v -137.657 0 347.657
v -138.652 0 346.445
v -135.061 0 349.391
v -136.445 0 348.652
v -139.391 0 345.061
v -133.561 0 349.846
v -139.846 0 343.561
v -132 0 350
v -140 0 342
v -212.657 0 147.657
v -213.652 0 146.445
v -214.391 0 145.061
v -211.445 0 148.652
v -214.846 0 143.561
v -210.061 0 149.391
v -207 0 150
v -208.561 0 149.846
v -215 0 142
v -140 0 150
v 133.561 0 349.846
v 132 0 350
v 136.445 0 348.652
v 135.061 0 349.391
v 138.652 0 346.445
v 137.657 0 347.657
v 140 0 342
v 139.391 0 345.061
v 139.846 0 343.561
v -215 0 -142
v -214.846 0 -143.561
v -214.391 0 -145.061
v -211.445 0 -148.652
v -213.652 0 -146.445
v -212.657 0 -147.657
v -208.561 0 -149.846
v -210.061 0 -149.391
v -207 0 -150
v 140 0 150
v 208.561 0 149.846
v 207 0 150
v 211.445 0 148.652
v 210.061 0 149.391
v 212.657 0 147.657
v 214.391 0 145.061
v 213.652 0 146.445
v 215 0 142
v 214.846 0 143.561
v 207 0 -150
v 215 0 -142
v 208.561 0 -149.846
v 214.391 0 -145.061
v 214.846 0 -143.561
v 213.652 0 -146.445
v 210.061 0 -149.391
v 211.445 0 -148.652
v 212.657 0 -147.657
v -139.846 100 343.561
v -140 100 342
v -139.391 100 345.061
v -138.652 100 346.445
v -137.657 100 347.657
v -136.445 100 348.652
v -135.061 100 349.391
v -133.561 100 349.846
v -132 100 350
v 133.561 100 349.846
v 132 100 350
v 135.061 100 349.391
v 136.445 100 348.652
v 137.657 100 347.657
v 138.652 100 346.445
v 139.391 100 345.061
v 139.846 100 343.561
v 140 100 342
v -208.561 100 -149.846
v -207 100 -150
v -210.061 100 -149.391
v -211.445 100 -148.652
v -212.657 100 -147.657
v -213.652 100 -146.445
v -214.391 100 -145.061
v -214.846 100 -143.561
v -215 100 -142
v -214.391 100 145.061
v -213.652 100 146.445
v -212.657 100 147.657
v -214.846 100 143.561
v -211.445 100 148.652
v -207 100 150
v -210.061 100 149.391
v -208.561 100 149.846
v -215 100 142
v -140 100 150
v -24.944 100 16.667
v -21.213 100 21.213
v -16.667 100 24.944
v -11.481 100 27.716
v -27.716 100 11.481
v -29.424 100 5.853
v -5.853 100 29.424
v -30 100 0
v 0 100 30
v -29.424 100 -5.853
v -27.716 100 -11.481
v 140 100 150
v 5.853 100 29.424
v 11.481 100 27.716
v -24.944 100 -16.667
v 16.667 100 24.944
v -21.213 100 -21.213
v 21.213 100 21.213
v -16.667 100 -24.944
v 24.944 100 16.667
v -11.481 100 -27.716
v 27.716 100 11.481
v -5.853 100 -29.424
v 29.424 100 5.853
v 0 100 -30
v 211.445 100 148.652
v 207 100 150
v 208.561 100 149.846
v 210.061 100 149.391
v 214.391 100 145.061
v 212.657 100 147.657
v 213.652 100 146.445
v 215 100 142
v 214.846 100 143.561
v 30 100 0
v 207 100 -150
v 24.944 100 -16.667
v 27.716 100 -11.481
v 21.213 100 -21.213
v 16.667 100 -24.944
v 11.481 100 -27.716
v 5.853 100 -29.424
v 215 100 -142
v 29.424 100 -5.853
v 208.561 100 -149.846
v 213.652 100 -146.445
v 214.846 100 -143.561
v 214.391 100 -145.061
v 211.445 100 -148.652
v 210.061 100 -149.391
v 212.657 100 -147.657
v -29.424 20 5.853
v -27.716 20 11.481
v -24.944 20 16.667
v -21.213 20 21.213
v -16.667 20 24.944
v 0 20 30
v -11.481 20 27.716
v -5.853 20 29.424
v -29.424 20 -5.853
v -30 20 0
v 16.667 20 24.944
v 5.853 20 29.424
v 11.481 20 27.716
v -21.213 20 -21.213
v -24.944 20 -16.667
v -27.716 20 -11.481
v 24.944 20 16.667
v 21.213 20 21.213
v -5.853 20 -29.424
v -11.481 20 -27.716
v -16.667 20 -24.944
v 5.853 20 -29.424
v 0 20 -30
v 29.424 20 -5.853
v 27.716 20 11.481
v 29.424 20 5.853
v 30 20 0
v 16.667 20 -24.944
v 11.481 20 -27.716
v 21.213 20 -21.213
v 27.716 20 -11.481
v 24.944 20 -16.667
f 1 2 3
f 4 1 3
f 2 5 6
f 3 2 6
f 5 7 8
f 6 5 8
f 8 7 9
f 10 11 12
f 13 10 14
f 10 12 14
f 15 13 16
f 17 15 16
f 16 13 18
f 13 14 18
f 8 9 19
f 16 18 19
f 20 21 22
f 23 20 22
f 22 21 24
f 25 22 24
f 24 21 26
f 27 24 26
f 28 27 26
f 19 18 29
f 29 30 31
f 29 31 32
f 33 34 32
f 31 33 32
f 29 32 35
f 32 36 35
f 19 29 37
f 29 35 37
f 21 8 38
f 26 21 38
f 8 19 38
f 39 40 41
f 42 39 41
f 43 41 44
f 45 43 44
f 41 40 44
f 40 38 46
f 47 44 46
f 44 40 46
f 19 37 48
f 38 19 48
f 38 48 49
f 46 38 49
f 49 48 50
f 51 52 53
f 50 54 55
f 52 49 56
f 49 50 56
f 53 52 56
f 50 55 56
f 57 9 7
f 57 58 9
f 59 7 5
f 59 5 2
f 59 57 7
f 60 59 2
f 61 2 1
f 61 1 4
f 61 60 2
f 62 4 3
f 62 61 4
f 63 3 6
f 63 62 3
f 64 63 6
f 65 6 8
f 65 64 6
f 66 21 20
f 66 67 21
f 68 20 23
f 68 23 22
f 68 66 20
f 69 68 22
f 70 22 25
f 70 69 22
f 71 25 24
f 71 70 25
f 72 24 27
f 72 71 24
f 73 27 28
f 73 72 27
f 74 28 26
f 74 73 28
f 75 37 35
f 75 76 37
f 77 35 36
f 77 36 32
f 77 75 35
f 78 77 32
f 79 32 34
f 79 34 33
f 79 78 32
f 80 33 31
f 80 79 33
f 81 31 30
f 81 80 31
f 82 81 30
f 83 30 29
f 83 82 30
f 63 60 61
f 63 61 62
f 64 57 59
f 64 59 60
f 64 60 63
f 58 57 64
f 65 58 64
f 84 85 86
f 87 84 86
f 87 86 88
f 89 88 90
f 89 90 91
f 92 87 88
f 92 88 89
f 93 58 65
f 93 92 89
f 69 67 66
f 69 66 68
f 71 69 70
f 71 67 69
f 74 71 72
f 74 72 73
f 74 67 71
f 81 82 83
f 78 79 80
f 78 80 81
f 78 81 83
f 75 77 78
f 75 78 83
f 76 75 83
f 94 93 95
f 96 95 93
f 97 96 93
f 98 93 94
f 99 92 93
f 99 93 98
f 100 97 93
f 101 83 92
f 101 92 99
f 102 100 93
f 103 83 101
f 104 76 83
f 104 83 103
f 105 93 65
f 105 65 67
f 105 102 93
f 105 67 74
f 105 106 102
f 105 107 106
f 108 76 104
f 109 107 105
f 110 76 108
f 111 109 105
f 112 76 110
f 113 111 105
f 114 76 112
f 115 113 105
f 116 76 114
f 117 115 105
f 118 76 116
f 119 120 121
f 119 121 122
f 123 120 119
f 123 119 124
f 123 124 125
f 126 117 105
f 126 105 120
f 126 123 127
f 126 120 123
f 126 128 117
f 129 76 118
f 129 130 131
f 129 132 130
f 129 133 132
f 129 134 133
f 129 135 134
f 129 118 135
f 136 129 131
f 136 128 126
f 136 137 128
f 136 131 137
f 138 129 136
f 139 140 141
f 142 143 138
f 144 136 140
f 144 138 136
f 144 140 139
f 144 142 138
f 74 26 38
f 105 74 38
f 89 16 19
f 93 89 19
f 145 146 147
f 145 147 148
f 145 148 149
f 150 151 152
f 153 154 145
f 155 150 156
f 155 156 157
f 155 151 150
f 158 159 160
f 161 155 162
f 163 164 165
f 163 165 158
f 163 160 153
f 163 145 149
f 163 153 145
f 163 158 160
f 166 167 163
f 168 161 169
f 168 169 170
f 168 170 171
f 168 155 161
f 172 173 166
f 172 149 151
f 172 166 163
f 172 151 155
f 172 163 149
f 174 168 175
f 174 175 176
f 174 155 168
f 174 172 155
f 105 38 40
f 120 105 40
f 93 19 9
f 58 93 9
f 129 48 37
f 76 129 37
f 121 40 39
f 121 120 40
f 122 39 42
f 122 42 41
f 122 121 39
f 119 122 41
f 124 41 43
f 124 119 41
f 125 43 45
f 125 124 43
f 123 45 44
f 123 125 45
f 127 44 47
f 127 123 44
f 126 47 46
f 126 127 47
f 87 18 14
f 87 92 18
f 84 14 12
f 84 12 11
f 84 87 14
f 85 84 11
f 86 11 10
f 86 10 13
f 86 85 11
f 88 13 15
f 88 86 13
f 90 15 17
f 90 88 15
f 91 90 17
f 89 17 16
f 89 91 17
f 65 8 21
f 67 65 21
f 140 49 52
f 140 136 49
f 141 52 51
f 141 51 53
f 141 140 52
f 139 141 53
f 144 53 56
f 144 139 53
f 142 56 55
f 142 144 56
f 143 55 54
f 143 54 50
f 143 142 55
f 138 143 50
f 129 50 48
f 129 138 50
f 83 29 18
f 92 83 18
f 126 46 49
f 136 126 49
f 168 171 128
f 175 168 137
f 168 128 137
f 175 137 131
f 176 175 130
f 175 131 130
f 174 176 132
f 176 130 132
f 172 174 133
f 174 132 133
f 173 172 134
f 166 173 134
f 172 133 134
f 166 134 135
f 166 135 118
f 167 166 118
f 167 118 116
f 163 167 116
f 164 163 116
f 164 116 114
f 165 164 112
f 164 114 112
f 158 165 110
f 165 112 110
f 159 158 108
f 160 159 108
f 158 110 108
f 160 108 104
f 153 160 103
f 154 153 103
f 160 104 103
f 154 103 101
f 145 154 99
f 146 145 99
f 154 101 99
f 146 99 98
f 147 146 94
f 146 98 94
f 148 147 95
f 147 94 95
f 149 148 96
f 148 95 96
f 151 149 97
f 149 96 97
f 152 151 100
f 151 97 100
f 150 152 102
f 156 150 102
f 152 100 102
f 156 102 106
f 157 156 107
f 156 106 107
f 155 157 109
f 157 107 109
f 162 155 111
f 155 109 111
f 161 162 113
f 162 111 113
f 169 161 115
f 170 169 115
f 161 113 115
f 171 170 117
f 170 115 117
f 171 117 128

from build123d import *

# Parameters (mm, degrees)
BOSS_EXTRUDE1_DEPTH = 100
FILLET2_R           = 8
SKETCH2_R           = 30
CUT_EXTRUDE1_DEPTH  = 80


with BuildPart() as part:
    # Sketch1 → Boss-Extrude1 (new body)
    with BuildSketch(Plane(origin=(0, 0, 0), x_dir=(1, 0, 0), z_dir=(0, 1, 0))):
        Polygon((-140, -150), (-140, -350), (140, -350), (140, -150), (215, -150), (215, 150), (-215, 150), (-215, -150), align=None)
    extrude(amount=BOSS_EXTRUDE1_DEPTH)

    # Fillet2
    fillet2_edges = [part.edges().sort_by_distance(p)[0] for p in [
        (140, 50, 350),
        (-140, 50, 350),
        (-215, 50, 150),
        (-215, 50, -150),
        (215, 50, -150),
        (215, 50, 150),
    ]]
    fillet(fillet2_edges, radius=FILLET2_R)

    # Sketch2 → Cut-Extrude1 (cut)
    with BuildSketch(Plane(origin=(0, 100, 0), x_dir=(1, 0, 0), z_dir=(0, 1, 0))):
        Circle(SKETCH2_R)
    extrude(amount=-CUT_EXTRUDE1_DEPTH, mode=Mode.SUBTRACT)


solid = part.part
